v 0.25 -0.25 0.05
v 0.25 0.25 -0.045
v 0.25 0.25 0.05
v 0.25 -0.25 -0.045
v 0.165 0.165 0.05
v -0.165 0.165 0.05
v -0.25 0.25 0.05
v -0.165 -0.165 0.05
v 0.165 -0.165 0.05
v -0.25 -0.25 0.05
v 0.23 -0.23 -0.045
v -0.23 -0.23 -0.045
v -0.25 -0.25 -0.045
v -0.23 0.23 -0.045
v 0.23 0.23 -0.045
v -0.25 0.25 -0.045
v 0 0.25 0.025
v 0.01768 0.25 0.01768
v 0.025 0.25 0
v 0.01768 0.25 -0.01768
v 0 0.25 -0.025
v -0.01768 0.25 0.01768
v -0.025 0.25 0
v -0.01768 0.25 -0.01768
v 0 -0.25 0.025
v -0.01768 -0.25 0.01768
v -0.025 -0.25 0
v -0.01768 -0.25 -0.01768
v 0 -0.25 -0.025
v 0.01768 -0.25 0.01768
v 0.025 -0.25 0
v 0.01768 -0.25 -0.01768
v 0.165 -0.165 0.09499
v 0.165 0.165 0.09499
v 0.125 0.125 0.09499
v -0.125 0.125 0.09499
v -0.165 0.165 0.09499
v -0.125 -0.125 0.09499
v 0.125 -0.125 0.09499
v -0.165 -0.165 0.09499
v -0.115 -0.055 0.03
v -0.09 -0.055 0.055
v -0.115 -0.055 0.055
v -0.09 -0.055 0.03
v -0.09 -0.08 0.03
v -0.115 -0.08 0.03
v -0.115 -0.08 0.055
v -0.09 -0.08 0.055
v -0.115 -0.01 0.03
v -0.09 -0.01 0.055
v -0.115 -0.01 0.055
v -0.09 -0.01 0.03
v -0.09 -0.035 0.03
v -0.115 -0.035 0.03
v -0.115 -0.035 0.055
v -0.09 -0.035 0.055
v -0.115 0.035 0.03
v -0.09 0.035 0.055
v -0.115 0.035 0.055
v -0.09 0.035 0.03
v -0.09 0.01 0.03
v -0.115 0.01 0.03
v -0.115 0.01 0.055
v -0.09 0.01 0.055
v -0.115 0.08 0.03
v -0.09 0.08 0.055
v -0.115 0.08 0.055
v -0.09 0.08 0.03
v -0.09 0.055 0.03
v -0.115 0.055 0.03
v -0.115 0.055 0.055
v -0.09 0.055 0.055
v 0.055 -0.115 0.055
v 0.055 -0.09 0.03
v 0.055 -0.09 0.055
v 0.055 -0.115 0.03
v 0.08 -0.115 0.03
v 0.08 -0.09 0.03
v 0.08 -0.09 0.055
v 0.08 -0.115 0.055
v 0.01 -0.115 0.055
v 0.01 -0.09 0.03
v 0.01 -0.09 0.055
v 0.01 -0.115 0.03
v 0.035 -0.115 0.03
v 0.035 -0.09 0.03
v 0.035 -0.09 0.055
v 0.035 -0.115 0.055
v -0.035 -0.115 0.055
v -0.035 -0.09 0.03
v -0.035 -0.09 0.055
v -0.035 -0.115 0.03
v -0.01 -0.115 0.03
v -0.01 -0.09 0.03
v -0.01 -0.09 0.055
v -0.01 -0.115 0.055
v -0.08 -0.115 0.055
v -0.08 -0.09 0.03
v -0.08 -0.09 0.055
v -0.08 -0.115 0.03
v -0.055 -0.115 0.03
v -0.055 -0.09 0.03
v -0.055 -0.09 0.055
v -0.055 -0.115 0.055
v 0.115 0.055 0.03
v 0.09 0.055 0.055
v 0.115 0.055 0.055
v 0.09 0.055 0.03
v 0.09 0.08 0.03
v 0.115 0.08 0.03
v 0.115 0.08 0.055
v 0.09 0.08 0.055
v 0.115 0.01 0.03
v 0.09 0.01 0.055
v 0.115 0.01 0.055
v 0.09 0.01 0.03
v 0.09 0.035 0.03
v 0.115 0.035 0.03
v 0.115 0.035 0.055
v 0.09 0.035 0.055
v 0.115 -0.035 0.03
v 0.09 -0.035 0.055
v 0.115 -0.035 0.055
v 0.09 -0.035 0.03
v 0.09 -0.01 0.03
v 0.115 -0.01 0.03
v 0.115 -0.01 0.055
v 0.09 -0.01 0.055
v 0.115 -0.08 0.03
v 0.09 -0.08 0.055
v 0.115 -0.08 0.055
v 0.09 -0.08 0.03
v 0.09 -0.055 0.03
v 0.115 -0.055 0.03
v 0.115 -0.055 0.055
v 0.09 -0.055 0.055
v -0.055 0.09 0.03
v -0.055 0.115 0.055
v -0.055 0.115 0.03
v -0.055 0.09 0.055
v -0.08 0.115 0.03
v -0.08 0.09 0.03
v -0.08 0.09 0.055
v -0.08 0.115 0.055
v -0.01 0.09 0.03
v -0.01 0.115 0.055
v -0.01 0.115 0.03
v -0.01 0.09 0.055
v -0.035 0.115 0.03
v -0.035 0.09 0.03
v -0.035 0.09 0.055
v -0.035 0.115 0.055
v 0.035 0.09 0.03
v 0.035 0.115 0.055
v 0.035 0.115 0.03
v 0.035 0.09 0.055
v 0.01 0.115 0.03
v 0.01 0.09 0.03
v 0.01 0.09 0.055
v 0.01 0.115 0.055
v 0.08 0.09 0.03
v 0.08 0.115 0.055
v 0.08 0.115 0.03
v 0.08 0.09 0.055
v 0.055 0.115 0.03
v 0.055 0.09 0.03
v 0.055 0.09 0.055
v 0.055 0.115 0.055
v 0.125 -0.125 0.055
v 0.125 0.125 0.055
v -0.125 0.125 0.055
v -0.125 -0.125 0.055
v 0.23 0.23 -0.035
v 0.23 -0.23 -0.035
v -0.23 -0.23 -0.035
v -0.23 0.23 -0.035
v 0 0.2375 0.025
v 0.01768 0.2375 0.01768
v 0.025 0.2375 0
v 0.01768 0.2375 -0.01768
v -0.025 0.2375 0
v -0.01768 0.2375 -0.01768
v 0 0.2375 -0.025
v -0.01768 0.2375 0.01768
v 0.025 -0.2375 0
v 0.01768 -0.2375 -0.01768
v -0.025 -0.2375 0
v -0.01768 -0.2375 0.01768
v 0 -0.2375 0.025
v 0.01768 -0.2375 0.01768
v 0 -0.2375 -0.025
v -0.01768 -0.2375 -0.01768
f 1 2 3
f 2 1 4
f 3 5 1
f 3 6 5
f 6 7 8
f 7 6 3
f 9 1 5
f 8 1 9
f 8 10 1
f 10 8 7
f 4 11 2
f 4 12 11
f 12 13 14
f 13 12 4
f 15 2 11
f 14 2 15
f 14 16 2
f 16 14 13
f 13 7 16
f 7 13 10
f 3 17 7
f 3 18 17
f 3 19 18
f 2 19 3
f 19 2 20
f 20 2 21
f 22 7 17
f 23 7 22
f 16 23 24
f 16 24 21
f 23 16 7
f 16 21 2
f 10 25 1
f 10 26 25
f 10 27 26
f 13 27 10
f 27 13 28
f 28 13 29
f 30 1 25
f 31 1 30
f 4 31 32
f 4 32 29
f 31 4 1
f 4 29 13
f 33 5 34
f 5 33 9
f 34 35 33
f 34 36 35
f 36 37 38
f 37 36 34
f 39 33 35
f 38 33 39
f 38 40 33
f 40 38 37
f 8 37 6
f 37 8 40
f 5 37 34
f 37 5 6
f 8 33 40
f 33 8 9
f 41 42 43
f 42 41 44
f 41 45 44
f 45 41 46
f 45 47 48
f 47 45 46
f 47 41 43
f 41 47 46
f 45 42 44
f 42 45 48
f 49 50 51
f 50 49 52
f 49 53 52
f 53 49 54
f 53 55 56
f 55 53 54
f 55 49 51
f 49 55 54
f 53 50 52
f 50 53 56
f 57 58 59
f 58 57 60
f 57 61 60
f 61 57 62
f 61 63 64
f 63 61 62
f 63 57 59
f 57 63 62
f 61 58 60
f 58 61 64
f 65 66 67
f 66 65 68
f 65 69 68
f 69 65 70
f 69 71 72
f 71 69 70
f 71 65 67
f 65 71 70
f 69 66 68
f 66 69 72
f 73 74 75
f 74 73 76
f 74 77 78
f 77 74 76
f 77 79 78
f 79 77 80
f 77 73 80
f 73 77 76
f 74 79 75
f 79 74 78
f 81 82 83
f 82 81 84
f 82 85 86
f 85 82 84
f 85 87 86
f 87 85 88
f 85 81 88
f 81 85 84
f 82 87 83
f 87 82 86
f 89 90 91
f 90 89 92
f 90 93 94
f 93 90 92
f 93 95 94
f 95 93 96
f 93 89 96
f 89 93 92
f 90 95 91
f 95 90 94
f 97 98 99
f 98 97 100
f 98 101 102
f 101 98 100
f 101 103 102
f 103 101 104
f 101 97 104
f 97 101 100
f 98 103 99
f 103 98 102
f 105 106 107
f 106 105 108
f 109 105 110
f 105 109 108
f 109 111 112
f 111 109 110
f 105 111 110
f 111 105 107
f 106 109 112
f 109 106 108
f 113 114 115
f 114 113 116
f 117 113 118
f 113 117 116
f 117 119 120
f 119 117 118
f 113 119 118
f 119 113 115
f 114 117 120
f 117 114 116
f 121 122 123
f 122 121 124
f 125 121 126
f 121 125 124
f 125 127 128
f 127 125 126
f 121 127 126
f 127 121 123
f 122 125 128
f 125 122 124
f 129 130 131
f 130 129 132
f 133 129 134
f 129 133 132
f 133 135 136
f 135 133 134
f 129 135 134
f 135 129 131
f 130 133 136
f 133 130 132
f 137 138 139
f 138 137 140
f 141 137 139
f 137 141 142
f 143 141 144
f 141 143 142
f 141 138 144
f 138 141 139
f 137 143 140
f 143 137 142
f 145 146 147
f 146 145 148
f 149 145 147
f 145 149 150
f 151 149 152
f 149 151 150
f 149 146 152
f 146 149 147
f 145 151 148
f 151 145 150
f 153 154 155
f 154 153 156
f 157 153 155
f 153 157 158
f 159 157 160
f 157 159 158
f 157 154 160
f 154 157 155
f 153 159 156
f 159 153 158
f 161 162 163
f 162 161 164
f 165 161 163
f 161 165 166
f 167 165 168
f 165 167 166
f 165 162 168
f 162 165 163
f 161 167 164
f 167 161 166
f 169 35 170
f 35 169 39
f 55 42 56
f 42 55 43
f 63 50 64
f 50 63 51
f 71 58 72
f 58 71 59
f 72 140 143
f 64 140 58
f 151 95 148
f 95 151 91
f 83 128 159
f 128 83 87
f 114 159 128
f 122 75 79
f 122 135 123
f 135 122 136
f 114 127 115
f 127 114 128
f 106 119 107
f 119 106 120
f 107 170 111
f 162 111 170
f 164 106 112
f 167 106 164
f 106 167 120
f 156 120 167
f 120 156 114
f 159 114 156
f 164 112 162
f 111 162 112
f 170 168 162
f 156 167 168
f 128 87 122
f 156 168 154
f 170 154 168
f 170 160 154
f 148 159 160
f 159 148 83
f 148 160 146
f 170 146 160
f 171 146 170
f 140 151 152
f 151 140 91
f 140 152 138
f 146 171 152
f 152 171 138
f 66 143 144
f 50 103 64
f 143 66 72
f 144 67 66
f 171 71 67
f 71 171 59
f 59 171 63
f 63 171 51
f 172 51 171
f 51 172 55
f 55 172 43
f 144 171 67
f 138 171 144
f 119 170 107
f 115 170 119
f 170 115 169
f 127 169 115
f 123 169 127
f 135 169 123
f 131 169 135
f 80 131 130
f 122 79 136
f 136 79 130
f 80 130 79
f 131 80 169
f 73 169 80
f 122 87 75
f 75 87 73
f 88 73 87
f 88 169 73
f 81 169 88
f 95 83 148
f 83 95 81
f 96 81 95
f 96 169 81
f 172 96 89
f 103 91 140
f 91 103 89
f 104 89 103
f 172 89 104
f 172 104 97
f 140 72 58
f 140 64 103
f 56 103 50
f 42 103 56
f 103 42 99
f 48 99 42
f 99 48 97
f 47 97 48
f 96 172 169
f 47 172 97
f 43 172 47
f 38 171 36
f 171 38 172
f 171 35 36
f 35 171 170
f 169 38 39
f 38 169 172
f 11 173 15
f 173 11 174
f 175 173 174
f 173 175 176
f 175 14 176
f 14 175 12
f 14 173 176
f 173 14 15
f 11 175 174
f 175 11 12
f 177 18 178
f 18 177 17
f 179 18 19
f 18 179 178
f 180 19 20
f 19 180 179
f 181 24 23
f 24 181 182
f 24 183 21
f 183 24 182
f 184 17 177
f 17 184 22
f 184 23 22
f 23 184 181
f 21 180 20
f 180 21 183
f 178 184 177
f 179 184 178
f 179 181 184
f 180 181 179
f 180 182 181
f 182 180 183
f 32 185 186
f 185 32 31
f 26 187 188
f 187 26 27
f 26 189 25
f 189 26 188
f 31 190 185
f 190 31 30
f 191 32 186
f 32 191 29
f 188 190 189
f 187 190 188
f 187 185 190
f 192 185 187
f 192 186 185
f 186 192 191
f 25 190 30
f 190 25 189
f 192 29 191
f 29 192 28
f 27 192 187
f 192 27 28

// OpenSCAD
// file: PowerSymbol.scad
symWidth = 0.038;
symHeight = 0.086;
symDepth = 0.01;
middleHeight = 0.0075;
topHorizOffset = 0.007;
sideVertOffset = 0.007;

module PowerSymbol() {
  linear_extrude(symDepth, center=true) {
    halfHei = symHeight/2;
    halfWid = symWidth/2;
    halfMid = middleHeight/2;
    polygon([
      [topHorizOffset, halfHei],
      [0, halfMid],
      [halfWid, sideVertOffset],
      [-topHorizOffset, -halfHei],
      [0, -halfMid],
      [-halfWid, -sideVertOffset]
    ]);
  }
}

PowerSymbol();
// file: BasicFPGAHousing_paintcap.scad
include <BasicFPGAHousing_shared.scad>;
use <BasicFPGAHousing_base.scad>;

module BasicFPGAHousing_paintcap() {
  bevelDepth = capBevel * sqrt(2);
  difference() {
    translate([0,0,baseTop]) {
      cube(size=[capSize, capSize, capDepth*2], center=true);
    }
    cube(size=[slotSize+eps, slotSize+eps, smallGridSize], center=true);
    for (edge=[1:4]) rotate([0,0,90*edge]) {
      translate([0,capSize/2,baseTop+capDepth]) rotate([45,0,0])
        cube(size=[capSize+0.1, bevelDepth, bevelDepth*2], center=true);
    }
  }
}

%BasicFPGAHousing_base();
BasicFPGAHousing_paintcap();
// file: BasicFPGAHousing_shared.scad
smallGridSize = 0.5;
baseSize = smallGridSize;
baseTop = 0.05;
baseBottom = -0.045;
baseDepth = baseTop - baseBottom;
baseCenter = (baseTop + baseBottom)/2;
baseBackRim = 0.02;
baseBackCutoutSize = baseSize - baseBackRim*2;
baseBackCutoutDepth = 0.01;
capSize = 0.41;
capDepth = 0.045;
capBevel = 0.01;
slotSize = smallGridSize * 0.5;
slotBottom = 0.03;
slotPinEdgeCount = 4;
slotPinEdgePad = 0.01;
slotPinEdgeSpacing = 0.045;
slotPinSize = 0.025;
slotPinDepth = 0.025;
eps = 0.00001;

module BasiFPGAHousing_chipcutout() {
  slotPinBaseOffset = (-slotPinEdgeCount-1)/2 * slotPinEdgeSpacing;
  slotPinEdgeOffset = slotSize/2 - slotPinSize/2 - slotPinEdgePad;
  union() {
    translate([0, 0, baseDepth/2 + slotBottom + slotPinDepth]) {
      cube(size=[slotSize, slotSize, baseDepth], center=true);
    }
    for(edge=[1:4]) rotate([0,0,90*edge]) {
      for(i=[1:slotPinEdgeCount]) {
        translate([
          slotPinBaseOffset + slotPinEdgeSpacing*i,
          slotPinEdgeOffset,
          slotBottom + slotPinDepth
        ]) {
          cube(size=[slotPinSize, slotPinSize, slotPinDepth*2], center=true);
        }
      }
    }
  }
}

module cablecutout() {
  cableradius = 0.025;
  cableDepth = 0.0125;
  translate([0,smallGridSize/2,0]) rotate([90,0,0]) {
    cylinder(h=cableDepth*2, r=cableradius, center=true, $fn=8);
  }
}
// main file
include <BasicFPGAHousing_shared.scad>;
use <BasicFPGAHousing_paintcap.scad>;
use <PowerSymbol.scad>;

module BasicFPGAHousing_base() {
  middleSize = (slotSize + capSize) / 2;
  difference() {
    union() {
      translate([0,0,baseCenter])
        cube(size=[baseSize, baseSize, baseDepth], center=true);
      translate([0,0,baseTop-eps])
        cube(size=[middleSize, middleSize, capDepth*2], center=true);
    }
    translate([0,0,baseBottom])
      cube(size=[baseBackCutoutSize, baseBackCutoutSize, baseBackCutoutDepth*2], center=true);
    BasiFPGAHousing_chipcutout();
    cablecutout();
    rotate([0,0,180]) cablecutout();
  }
}

BasicFPGAHousing_base();
%BasicFPGAHousing_paintcap();
%translate([0.05,smallGridSize/2,0]) rotate([-90, 0, 0]) PowerSymbol();
